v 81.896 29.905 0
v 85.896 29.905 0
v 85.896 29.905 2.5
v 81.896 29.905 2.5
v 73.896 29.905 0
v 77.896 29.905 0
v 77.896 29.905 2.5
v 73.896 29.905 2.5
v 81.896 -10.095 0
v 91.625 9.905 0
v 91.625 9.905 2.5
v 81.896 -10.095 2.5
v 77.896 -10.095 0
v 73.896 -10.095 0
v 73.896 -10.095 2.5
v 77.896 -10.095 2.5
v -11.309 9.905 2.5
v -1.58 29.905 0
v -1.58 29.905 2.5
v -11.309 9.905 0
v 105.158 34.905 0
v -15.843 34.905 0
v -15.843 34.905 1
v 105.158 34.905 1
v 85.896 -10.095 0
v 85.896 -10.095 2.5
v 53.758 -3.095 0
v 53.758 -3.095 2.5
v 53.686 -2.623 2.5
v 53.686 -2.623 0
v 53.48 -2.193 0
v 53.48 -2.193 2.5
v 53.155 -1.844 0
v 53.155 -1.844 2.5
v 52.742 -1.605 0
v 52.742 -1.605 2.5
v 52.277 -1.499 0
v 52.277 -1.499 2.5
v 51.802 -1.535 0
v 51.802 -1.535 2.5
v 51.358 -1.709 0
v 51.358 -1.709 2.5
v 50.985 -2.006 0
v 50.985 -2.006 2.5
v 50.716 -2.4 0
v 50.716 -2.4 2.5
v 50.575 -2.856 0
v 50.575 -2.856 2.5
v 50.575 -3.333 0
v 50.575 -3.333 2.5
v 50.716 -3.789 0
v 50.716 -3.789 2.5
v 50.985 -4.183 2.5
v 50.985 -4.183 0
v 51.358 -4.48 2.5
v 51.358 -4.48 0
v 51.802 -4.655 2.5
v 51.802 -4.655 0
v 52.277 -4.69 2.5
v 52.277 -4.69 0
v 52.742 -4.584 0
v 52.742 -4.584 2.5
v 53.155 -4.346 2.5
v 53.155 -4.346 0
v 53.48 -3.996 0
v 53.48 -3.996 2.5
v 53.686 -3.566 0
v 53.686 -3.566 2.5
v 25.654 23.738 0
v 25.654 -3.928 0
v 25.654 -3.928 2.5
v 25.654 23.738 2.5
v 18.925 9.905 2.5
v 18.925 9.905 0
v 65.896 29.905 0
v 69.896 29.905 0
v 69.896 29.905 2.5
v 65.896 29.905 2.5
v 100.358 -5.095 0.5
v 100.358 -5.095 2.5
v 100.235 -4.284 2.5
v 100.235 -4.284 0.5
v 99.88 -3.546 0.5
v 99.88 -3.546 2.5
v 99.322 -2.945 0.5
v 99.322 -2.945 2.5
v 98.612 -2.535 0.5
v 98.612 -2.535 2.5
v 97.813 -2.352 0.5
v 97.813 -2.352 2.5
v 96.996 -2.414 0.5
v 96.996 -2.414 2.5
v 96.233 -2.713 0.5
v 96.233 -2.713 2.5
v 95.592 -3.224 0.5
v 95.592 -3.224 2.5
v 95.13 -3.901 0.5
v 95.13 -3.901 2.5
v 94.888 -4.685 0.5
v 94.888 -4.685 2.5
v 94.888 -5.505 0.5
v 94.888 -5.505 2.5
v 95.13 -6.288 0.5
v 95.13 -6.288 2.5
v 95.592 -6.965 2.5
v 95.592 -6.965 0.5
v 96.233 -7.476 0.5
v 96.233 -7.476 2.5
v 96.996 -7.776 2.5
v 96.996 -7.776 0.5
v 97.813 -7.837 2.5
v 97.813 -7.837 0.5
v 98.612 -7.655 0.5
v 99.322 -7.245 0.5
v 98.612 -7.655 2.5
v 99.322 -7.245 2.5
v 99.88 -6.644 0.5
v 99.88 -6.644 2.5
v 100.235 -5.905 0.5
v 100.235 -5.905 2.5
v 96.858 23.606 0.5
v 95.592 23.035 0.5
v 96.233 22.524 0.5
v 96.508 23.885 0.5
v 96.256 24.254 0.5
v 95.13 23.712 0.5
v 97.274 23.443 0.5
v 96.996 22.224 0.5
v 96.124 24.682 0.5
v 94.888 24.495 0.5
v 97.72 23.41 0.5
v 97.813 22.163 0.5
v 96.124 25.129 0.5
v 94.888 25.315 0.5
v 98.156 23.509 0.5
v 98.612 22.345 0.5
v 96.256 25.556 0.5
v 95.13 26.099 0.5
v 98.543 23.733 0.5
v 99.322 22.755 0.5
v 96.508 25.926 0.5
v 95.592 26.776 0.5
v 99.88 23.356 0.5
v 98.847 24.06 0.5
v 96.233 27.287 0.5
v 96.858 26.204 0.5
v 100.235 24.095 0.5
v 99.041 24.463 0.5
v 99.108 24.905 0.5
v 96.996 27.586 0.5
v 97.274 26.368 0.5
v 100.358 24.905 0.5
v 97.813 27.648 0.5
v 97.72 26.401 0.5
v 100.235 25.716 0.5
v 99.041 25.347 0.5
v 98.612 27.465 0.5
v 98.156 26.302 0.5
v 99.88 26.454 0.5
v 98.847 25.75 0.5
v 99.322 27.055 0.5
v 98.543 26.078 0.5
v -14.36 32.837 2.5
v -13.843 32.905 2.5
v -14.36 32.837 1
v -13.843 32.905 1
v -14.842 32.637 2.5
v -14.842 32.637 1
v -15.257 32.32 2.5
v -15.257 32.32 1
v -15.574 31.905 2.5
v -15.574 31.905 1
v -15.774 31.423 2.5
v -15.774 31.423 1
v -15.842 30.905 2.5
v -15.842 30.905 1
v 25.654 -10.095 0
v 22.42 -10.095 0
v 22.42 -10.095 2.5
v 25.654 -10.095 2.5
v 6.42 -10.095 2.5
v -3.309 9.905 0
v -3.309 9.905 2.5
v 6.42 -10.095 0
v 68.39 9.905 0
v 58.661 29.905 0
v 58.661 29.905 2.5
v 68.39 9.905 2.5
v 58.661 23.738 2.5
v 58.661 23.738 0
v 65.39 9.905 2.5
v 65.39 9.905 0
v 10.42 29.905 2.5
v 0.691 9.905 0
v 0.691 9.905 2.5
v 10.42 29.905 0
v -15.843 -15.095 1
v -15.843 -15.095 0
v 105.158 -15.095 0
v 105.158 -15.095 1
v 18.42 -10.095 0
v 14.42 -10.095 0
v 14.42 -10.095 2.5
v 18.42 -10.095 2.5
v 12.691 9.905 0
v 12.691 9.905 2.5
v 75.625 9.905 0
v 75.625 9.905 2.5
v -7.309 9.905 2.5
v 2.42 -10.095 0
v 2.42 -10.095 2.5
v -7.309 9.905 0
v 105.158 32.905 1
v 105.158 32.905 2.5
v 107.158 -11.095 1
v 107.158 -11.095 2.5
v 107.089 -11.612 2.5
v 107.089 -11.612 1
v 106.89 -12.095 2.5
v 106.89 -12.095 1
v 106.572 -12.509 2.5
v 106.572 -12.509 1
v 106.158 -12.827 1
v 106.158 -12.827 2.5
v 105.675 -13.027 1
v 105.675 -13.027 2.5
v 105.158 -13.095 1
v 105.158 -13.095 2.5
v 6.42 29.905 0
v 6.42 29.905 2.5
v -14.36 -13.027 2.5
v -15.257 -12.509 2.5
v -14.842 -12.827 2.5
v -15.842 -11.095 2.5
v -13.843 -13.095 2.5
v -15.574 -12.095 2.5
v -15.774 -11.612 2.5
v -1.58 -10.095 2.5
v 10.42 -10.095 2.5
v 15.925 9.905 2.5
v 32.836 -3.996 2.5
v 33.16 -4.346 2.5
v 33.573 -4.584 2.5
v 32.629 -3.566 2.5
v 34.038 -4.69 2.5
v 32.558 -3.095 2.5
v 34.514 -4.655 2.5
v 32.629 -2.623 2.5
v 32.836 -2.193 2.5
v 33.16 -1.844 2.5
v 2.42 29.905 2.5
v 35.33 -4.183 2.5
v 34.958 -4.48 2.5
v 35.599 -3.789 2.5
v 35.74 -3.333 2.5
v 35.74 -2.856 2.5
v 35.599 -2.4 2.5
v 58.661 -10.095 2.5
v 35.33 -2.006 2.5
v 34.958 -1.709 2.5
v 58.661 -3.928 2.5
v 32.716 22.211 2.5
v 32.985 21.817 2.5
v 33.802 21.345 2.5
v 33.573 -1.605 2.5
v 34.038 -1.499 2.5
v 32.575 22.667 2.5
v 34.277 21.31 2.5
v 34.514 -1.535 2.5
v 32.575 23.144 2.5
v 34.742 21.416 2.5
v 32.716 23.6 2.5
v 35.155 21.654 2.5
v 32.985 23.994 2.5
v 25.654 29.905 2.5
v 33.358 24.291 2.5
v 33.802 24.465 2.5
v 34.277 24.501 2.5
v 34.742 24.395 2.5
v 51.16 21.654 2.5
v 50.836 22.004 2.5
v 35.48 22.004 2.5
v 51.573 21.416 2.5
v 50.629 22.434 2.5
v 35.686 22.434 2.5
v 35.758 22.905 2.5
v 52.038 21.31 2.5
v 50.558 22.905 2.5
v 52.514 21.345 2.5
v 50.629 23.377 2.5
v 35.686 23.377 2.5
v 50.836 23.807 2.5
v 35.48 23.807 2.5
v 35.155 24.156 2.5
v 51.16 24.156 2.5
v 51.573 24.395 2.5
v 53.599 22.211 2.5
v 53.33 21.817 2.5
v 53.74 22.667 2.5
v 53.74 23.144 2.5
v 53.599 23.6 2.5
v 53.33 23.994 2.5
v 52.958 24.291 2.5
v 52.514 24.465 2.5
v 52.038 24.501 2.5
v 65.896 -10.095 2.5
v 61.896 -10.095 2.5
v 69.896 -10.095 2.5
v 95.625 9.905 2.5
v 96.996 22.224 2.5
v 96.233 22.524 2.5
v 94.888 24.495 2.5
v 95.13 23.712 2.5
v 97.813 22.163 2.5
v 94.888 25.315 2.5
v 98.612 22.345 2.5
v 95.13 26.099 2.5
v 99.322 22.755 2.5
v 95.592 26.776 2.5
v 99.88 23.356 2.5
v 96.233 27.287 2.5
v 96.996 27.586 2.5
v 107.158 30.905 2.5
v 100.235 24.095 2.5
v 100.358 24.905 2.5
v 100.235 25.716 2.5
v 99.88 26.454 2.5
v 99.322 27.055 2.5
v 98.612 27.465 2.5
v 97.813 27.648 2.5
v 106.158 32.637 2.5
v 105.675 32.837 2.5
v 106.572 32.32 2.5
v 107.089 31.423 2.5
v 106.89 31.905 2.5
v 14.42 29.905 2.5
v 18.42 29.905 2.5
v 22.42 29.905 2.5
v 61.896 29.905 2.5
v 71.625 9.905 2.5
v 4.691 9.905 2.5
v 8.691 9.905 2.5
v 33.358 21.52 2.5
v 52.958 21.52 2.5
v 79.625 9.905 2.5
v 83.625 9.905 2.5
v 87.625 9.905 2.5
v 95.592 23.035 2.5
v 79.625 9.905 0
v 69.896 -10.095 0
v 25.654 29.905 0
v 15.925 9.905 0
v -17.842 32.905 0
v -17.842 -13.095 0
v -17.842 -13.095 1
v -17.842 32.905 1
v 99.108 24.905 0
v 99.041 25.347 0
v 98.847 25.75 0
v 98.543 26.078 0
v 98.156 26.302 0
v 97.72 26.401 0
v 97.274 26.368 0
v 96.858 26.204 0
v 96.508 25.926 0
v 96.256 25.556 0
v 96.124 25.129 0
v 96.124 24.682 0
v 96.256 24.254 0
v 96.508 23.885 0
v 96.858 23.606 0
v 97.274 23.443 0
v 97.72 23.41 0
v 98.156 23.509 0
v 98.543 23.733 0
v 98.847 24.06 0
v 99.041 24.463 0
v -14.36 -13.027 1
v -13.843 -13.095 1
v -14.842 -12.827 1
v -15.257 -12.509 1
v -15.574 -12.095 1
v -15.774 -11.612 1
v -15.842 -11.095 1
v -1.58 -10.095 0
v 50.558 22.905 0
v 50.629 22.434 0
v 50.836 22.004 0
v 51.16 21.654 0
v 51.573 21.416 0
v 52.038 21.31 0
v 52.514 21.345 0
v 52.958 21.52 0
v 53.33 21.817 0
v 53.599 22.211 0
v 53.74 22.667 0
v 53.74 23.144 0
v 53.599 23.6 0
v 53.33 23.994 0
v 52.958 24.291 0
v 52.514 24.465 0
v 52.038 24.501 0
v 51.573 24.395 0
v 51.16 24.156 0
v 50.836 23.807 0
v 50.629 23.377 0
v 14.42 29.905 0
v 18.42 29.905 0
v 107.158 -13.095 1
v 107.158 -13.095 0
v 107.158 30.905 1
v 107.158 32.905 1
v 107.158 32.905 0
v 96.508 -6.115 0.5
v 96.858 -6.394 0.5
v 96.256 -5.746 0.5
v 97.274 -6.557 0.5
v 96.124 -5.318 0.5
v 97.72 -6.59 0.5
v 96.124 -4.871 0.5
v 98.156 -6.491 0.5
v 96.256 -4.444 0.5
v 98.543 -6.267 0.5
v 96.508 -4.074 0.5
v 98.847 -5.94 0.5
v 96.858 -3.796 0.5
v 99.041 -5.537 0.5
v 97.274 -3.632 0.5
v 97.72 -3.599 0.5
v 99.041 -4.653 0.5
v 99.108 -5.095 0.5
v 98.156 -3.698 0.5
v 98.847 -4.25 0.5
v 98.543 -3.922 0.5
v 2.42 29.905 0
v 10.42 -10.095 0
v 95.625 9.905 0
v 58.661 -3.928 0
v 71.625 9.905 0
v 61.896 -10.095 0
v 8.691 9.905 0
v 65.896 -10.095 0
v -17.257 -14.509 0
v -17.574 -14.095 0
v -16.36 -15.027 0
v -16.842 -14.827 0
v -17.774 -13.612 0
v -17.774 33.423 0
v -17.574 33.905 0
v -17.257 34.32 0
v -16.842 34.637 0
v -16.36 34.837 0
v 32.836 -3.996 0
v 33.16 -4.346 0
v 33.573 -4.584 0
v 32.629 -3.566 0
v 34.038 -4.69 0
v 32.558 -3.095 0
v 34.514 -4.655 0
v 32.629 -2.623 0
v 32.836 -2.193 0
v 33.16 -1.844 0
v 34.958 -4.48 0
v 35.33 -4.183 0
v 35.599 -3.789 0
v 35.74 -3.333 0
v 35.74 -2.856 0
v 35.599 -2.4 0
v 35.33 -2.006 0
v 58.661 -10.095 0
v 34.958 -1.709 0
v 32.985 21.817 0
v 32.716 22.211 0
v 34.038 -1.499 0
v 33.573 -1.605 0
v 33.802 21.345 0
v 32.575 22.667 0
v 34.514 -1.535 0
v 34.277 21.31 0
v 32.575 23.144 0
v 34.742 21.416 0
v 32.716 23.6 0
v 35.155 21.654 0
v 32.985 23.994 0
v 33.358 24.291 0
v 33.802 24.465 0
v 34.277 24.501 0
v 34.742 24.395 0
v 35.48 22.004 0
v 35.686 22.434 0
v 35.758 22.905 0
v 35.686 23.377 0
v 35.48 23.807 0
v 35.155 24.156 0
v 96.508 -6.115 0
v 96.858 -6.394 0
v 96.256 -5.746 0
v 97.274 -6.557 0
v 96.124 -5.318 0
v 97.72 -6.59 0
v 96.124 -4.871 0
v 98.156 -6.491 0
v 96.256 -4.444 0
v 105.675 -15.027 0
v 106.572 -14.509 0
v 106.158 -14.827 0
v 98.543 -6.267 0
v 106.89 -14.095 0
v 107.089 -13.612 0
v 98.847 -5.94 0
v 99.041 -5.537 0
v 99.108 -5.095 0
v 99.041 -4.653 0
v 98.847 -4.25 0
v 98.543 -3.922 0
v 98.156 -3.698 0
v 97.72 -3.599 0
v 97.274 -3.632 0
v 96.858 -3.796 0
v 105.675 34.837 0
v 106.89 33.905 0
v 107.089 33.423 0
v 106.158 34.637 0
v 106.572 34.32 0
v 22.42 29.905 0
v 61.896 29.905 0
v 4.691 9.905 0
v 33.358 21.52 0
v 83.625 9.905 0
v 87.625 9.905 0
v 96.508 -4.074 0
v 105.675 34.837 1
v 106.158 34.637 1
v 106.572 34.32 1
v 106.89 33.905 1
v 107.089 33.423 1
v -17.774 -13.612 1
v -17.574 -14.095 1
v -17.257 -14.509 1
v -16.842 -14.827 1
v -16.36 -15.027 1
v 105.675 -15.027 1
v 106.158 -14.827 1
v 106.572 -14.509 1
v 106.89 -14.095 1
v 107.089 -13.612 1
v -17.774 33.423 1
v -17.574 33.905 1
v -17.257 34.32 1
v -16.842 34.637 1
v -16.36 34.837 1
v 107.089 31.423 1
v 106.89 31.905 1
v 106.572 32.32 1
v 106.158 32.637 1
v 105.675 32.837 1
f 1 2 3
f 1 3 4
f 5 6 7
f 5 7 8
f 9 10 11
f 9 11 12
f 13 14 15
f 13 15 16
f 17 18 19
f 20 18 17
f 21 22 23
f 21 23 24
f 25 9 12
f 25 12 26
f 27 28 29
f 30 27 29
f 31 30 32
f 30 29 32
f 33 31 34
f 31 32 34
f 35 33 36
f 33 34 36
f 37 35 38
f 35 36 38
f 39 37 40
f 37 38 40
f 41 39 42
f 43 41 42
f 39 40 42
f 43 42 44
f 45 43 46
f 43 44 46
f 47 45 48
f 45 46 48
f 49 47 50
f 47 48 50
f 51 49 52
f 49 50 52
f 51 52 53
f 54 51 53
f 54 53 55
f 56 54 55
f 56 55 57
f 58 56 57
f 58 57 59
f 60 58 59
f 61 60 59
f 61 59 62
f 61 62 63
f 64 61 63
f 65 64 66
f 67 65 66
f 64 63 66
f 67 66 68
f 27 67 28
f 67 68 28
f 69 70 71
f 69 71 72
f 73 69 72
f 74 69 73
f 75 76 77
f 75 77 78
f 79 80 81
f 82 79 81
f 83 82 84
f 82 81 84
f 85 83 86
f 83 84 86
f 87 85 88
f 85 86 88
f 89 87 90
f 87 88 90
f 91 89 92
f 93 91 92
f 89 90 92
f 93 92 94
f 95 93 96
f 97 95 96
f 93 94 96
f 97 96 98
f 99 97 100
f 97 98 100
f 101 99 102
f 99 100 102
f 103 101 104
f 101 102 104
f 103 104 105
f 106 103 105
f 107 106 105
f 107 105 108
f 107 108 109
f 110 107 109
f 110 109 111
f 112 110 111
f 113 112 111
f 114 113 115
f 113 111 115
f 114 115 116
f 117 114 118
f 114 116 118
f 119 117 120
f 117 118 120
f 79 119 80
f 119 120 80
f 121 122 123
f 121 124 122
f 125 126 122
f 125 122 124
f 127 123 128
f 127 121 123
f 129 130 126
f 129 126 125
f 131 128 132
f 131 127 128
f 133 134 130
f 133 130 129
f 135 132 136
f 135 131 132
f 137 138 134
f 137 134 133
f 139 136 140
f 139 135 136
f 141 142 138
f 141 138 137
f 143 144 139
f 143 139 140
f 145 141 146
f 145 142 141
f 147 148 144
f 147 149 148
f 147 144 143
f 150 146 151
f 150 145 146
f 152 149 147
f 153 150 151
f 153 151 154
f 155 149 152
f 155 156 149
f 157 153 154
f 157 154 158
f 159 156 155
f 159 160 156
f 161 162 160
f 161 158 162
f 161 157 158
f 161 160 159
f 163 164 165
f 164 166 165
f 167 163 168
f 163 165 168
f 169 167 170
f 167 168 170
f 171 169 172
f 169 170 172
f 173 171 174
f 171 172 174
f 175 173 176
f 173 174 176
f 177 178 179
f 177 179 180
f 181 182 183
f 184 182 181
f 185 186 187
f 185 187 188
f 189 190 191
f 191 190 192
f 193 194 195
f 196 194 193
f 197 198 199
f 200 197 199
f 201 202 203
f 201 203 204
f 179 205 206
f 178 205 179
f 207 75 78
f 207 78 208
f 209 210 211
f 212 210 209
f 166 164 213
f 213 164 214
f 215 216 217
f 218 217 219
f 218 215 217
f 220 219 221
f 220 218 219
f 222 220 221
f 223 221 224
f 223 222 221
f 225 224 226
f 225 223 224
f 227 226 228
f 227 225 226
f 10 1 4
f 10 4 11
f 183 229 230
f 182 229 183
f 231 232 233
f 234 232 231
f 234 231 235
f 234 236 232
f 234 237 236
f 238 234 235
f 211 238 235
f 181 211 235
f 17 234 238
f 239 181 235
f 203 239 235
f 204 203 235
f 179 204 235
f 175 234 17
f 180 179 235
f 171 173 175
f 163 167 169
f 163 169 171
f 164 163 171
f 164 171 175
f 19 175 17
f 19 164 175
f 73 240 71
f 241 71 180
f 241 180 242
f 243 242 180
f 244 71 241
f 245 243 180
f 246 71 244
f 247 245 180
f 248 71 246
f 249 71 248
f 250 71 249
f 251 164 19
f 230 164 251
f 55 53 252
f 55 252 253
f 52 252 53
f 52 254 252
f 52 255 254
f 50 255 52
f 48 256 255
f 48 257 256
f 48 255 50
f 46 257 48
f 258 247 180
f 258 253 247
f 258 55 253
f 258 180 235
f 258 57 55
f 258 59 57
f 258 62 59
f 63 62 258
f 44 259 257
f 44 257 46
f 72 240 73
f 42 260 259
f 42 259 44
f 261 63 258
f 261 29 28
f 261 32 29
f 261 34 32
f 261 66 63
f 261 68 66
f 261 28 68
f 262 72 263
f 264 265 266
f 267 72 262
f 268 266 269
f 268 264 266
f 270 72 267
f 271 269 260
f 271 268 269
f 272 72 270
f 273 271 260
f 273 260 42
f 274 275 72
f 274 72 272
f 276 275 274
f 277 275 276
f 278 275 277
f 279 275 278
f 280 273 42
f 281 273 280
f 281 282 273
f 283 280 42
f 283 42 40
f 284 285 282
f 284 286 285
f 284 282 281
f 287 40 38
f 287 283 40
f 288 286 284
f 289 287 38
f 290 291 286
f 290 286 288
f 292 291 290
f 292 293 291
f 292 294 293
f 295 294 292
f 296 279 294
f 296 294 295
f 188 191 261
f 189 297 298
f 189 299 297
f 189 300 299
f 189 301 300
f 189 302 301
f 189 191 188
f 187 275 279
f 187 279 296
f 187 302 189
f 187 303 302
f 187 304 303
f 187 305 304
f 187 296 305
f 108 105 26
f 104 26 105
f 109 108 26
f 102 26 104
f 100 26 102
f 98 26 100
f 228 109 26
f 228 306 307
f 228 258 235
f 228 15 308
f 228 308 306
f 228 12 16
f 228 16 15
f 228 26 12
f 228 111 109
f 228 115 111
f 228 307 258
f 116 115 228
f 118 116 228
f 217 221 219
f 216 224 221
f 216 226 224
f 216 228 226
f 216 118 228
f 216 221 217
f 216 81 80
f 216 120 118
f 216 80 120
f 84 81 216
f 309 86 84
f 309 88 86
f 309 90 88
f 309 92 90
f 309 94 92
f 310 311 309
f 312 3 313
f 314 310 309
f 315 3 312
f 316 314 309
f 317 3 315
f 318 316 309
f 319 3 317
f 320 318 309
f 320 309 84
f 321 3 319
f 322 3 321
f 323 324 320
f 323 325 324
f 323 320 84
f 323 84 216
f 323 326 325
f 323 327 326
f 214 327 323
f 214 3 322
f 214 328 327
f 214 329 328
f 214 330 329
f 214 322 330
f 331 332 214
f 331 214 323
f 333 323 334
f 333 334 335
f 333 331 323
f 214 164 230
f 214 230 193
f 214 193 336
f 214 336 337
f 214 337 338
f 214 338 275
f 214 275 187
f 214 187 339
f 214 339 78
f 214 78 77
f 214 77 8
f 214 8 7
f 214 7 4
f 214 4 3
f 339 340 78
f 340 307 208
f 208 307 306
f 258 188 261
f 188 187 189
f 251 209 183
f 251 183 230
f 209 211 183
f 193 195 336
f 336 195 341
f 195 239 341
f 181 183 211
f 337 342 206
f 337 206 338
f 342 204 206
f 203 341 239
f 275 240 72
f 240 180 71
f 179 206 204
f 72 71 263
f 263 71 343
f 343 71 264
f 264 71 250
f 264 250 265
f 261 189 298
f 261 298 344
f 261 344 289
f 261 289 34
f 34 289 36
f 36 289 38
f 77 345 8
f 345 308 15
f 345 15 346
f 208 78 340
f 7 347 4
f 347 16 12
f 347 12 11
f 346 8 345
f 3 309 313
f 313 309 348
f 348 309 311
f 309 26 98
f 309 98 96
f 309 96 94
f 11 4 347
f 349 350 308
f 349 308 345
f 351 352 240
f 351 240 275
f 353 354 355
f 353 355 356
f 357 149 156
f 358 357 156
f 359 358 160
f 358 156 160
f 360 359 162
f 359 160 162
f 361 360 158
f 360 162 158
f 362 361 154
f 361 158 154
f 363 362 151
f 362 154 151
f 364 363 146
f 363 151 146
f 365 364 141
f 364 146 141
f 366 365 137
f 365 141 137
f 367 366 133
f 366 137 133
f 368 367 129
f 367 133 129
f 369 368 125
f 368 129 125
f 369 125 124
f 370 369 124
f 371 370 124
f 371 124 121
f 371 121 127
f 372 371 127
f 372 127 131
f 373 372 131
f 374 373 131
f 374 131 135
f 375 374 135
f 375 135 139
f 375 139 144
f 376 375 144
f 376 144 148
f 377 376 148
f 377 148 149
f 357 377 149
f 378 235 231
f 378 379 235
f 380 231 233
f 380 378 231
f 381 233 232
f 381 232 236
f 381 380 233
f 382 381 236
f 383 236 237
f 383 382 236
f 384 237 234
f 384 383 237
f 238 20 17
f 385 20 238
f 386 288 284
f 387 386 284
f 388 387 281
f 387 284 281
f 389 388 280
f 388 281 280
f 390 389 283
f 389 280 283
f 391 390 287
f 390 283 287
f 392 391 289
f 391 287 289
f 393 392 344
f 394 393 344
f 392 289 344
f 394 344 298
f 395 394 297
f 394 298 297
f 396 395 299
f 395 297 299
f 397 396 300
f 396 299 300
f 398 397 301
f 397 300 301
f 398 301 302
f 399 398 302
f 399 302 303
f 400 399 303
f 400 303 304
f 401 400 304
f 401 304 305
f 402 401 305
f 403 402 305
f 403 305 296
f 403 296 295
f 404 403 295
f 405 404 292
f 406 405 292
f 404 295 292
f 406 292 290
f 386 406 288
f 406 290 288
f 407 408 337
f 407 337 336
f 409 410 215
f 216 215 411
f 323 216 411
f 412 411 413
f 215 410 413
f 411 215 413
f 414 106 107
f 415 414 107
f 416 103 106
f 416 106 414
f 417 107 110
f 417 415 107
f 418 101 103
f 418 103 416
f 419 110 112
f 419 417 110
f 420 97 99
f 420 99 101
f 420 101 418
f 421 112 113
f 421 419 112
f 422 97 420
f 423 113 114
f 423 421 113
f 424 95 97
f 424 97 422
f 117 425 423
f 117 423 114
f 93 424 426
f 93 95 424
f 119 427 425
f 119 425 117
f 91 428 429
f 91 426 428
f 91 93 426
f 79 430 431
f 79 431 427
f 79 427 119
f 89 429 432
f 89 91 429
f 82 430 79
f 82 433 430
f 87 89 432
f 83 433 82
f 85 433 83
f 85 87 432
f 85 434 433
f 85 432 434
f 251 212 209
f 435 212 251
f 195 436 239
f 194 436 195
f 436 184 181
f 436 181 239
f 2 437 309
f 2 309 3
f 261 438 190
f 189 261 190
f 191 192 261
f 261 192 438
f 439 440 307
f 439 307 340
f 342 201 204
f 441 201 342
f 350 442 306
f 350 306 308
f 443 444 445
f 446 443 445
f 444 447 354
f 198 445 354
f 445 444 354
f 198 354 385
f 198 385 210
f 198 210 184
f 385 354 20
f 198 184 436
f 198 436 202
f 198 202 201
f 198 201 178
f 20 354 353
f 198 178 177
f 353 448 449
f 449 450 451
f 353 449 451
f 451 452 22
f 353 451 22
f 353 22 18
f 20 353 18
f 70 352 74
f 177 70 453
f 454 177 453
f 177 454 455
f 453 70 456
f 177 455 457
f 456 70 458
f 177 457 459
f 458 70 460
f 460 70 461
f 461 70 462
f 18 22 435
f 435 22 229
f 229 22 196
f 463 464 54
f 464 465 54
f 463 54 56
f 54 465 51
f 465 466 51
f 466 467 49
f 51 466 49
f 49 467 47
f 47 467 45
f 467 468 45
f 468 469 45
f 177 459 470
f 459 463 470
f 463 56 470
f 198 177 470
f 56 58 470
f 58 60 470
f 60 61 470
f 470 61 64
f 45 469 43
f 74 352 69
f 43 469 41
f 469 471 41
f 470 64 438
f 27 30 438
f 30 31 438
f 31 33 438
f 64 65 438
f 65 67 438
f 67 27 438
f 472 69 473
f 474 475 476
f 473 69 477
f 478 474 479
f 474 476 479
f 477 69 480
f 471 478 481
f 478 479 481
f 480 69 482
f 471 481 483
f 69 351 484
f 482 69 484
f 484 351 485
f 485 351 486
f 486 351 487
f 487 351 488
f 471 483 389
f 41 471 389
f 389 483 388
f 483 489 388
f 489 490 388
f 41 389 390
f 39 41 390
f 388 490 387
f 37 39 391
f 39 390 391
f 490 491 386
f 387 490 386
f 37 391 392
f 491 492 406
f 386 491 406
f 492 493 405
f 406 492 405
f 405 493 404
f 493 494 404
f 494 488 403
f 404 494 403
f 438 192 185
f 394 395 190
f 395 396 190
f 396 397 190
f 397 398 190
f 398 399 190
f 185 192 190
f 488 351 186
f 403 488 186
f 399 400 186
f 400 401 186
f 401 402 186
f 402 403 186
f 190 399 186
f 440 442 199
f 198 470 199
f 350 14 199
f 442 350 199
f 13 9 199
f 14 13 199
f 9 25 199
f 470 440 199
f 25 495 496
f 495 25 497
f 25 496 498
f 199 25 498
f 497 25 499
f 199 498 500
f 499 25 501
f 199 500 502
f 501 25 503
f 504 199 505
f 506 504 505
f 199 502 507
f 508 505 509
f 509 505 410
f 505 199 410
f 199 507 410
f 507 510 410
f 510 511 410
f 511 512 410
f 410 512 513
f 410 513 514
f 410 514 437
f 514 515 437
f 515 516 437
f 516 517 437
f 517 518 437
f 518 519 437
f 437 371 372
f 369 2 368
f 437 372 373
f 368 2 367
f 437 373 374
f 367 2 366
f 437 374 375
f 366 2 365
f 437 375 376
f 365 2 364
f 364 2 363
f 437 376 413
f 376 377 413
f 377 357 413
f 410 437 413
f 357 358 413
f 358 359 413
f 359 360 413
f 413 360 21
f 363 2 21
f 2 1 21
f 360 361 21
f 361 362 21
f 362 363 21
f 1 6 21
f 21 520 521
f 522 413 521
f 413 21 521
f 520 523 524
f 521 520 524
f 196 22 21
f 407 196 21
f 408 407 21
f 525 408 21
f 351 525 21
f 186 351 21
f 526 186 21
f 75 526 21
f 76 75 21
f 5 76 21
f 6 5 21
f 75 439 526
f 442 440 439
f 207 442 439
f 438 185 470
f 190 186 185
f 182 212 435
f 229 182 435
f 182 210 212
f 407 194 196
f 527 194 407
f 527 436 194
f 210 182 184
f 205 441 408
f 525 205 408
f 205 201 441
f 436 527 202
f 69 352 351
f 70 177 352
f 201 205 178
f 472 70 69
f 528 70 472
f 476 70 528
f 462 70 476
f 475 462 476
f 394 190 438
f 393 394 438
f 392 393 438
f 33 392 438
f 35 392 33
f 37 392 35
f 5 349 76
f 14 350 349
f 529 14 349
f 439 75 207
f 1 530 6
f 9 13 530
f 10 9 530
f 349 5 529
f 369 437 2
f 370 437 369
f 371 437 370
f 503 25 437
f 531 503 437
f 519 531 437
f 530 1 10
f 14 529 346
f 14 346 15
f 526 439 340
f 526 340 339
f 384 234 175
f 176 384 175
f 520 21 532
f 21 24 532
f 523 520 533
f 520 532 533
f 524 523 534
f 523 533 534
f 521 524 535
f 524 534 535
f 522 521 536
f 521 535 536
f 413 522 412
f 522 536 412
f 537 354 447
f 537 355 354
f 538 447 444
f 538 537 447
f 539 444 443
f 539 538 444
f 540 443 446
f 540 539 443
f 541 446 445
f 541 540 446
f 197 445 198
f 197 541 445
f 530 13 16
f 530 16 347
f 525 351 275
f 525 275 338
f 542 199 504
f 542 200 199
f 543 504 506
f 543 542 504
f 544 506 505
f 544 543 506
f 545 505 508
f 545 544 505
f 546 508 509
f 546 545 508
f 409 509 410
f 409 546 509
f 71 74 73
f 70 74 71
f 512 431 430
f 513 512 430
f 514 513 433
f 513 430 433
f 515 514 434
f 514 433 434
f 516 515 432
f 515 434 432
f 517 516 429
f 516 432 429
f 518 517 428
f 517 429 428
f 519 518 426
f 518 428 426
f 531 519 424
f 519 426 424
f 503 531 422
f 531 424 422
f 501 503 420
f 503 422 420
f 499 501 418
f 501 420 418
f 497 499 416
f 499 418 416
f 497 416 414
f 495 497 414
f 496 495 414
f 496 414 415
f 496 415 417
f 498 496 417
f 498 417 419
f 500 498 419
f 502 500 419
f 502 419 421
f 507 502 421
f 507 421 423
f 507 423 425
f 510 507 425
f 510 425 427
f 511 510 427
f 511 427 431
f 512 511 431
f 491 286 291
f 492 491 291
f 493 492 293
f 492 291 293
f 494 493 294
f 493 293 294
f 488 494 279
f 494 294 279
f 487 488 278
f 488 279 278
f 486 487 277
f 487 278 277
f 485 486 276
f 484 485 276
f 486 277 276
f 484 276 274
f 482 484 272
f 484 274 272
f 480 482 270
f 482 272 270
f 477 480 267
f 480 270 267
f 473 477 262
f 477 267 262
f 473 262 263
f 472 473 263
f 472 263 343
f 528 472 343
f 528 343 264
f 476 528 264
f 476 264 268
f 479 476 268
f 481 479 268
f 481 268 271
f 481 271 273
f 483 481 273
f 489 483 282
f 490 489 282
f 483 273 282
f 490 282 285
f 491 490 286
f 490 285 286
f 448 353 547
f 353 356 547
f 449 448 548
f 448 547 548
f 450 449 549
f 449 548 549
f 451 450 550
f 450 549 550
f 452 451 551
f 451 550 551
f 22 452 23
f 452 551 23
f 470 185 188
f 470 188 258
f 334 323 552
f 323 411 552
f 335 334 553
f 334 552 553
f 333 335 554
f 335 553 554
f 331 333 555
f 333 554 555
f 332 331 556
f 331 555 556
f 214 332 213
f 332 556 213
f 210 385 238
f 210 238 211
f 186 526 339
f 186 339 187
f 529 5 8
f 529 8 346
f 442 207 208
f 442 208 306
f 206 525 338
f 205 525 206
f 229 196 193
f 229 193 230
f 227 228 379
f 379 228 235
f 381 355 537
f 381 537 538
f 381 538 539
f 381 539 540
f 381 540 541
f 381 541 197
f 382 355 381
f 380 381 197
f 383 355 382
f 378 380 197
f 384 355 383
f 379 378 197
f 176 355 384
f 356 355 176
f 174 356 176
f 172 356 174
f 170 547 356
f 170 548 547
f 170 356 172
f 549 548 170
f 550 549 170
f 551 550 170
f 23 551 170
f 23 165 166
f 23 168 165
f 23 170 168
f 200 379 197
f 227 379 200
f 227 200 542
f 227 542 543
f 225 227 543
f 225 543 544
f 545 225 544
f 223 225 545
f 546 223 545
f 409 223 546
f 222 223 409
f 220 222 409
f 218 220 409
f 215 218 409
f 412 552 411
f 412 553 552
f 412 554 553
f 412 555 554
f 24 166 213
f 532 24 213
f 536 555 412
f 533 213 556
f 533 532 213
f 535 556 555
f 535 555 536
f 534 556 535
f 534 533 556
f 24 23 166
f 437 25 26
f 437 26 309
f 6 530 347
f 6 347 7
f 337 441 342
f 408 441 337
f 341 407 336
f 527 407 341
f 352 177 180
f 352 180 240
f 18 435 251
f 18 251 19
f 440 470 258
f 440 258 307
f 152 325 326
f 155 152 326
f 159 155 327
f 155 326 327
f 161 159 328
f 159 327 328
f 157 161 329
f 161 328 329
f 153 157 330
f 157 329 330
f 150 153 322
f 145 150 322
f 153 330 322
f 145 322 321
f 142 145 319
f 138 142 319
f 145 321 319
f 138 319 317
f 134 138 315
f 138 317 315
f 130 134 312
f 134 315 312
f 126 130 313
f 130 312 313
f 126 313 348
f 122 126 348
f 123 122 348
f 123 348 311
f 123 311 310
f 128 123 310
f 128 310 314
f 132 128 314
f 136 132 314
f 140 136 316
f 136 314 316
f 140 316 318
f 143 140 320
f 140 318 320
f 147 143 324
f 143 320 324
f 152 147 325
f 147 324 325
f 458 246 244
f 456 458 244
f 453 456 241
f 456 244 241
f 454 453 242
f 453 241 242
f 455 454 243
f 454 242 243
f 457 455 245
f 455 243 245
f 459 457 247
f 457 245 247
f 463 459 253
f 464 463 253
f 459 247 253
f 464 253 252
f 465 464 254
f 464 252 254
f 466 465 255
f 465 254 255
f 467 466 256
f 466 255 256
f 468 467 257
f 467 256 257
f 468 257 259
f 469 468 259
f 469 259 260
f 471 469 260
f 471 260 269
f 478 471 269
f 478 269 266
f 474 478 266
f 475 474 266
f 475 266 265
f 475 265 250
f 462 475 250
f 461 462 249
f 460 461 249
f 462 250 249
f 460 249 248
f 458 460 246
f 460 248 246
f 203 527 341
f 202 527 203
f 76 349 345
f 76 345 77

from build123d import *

# Parameters (mm, degrees)
ESBO_O1_W                  = 125
ESBO_O1_H                  = 50
RESSALTO_EXTRUS_O1_DEPTH   = 2.5
ESBO_O2_R                  = 1.6
CORTE_EXTRUS_O2_DEPTH      = 2.5
CORTE_EXTRUS_O3_DEPTH      = 1.5
CORTE_EXTRUS_O5_DEPTH      = 113.726994752
CORTE_EXTRUS_O5_DEPTH_BACK = 113.726994752
ESBO_O12_R                 = 2.75
CORTE_EXTRUS_O6_DEPTH      = 2
ESBO_O19_R                 = 1.5
CORTE_EXTRUS_O7_DEPTH      = 2
FILETE1_R                  = 2


with BuildPart() as part:
    # Esboço1 → Ressalto-extrusão1 (new body)
    with BuildSketch(Plane.XY):
        with Locations((44.657564369, 9.905325444)):
            Rectangle(ESBO_O1_W, ESBO_O1_H)
    extrude(amount=RESSALTO_EXTRUS_O1_DEPTH)

    # Esboço2 → Corte-extrusão2 (cut)
    with BuildSketch(Plane.XY.offset(2.5)):
        with Locations((34.157564369, 22.905325444)):
            Circle(ESBO_O2_R)
        with Locations(Location((34.157564369, -3.094674556, 0), (0, 0, 180))):
            Circle(ESBO_O2_R)
        with Locations((52.157564369, -3.094674556)):
            Circle(ESBO_O2_R)
        with Locations(Location((52.157564369, 22.905325444, 0), (0, 0, 180))):
            Circle(ESBO_O2_R)
    extrude(amount=-CORTE_EXTRUS_O2_DEPTH, mode=Mode.SUBTRACT)

    # Esboço3 → Corte-extrusão3 (cut)
    with BuildSketch(Plane.XY.offset(2.5)):
        Polygon((-17.842435631, 32.905325444), (-17.842435631, 9.905325444), (-15.842435631, 9.905325444), (-15.842435631, 32.905325444), (107.157564369, 32.905325444), (107.157564369, 34.905325444), (-15.842435631, 34.905325444), (-17.842435631, 34.905325444), align=None)
        Polygon((-15.842435631, 9.905325444), (-17.842435631, 9.905325444), (-17.842435631, -13.094674556), (-17.842435631, -15.094674556), (-15.842435631, -15.094674556), (107.157564369, -15.094674556), (107.157564369, -13.094674556), (-15.842435631, -13.094674556), align=None)
    extrude(amount=-CORTE_EXTRUS_O3_DEPTH, mode=Mode.SUBTRACT)

    # Esboço4 → Corte-extrusão5 (cut, two sides: drawn at the far end of the back side and taken through both)
    with BuildSketch(Plane.XY.offset(2.5).offset(-CORTE_EXTRUS_O5_DEPTH_BACK)):
        Polygon((15.925055292, 9.905325444), (25.654023464, 29.905325444), (22.419553485, 29.905325444), (12.690585312, 9.905325444), (22.419553485, -10.094674556), (25.654023464, -10.094674556), align=None)
        Polygon((25.654023464, 23.738176067), (18.925055292, 9.905325444), (25.654023464, -3.927525179), align=None)
        Polygon((8.690585312, 9.905325444), (18.419553485, 29.905325444), (14.419553485, 29.905325444), (4.690585312, 9.905325444), (14.419553485, -10.094674556), (18.419553485, -10.094674556), align=None)
        Polygon((0.690585312, 9.905325444), (10.419553485, 29.905325444), (6.419553485, 29.905325444), (-3.309414688, 9.905325444), (6.419553485, -10.094674556), (10.419553485, -10.094674556), align=None)
        Polygon((-7.309414688, 9.905325444), (2.419553485, 29.905325444), (-1.580446515, 29.905325444), (-11.309414688, 9.905325444), (-1.580446515, -10.094674556), (2.419553485, -10.094674556), align=None)
        Polygon((85.895575254, -10.094674556), (95.624543426, 9.905325444), (85.895575254, 29.905325444), (81.895575254, 29.905325444), (91.624543426, 9.905325444), (81.895575254, -10.094674556), align=None)
        Polygon((77.895575254, -10.094674556), (87.624543426, 9.905325444), (77.895575254, 29.905325444), (73.895575254, 29.905325444), (83.624543426, 9.905325444), (73.895575254, -10.094674556), align=None)
        Polygon((69.895575254, -10.094674556), (79.624543426, 9.905325444), (69.895575254, 29.905325444), (65.895575254, 29.905325444), (75.624543426, 9.905325444), (65.895575254, -10.094674556), align=None)
        Polygon((71.624543426, 9.905325444), (61.895575254, 29.905325444), (58.661105274, 29.905325444), (68.390073446, 9.905325444), (58.661105274, -10.094674556), (61.895575254, -10.094674556), align=None)
        Polygon((65.390073446, 9.905325444), (58.661105274, -3.927525179), (58.661105274, 23.738176067), align=None)
    extrude(amount=CORTE_EXTRUS_O5_DEPTH + CORTE_EXTRUS_O5_DEPTH_BACK, mode=Mode.SUBTRACT)

    # Esboço12 → Corte-extrusão6 (cut)
    with BuildSketch(Plane.XY.offset(2.5)):
        with Locations((97.607564369, 24.905325444)):
            Circle(ESBO_O12_R)
        with Locations((97.607564369, -5.094674556)):
            Circle(ESBO_O12_R)
    extrude(amount=-CORTE_EXTRUS_O6_DEPTH, mode=Mode.SUBTRACT)

    # Esboço19 → Corte-extrusão7 (cut)
    with BuildSketch(Plane.XY.offset(0.5)):
        with Locations((97.607564369, 24.905325444)):
            Circle(ESBO_O19_R)
        with Locations((97.607564369, -5.094674556)):
            Circle(ESBO_O19_R)
    extrude(amount=-CORTE_EXTRUS_O7_DEPTH, mode=Mode.SUBTRACT)

    # Filete1
    filete1_edges = [part.edges().sort_by_distance(p)[0] for p in [
        (-17.842435631, -15.094674556, 0.5),
        (-15.842435631, -13.094674556, 1.75),
        (-17.842435631, 34.905325444, 0.5),
        (-15.842435631, 32.905325444, 1.75),
        (107.157564369, -15.094674556, 0.5),
        (107.157564369, -13.094674556, 1.75),
        (107.157564369, 32.905325444, 1.75),
        (107.157564369, 34.905325444, 0.5),
    ]]
    fillet(filete1_edges, radius=FILETE1_R - 0.0001)  # a hair under: the kernel refuses the full size


solid = part.part
